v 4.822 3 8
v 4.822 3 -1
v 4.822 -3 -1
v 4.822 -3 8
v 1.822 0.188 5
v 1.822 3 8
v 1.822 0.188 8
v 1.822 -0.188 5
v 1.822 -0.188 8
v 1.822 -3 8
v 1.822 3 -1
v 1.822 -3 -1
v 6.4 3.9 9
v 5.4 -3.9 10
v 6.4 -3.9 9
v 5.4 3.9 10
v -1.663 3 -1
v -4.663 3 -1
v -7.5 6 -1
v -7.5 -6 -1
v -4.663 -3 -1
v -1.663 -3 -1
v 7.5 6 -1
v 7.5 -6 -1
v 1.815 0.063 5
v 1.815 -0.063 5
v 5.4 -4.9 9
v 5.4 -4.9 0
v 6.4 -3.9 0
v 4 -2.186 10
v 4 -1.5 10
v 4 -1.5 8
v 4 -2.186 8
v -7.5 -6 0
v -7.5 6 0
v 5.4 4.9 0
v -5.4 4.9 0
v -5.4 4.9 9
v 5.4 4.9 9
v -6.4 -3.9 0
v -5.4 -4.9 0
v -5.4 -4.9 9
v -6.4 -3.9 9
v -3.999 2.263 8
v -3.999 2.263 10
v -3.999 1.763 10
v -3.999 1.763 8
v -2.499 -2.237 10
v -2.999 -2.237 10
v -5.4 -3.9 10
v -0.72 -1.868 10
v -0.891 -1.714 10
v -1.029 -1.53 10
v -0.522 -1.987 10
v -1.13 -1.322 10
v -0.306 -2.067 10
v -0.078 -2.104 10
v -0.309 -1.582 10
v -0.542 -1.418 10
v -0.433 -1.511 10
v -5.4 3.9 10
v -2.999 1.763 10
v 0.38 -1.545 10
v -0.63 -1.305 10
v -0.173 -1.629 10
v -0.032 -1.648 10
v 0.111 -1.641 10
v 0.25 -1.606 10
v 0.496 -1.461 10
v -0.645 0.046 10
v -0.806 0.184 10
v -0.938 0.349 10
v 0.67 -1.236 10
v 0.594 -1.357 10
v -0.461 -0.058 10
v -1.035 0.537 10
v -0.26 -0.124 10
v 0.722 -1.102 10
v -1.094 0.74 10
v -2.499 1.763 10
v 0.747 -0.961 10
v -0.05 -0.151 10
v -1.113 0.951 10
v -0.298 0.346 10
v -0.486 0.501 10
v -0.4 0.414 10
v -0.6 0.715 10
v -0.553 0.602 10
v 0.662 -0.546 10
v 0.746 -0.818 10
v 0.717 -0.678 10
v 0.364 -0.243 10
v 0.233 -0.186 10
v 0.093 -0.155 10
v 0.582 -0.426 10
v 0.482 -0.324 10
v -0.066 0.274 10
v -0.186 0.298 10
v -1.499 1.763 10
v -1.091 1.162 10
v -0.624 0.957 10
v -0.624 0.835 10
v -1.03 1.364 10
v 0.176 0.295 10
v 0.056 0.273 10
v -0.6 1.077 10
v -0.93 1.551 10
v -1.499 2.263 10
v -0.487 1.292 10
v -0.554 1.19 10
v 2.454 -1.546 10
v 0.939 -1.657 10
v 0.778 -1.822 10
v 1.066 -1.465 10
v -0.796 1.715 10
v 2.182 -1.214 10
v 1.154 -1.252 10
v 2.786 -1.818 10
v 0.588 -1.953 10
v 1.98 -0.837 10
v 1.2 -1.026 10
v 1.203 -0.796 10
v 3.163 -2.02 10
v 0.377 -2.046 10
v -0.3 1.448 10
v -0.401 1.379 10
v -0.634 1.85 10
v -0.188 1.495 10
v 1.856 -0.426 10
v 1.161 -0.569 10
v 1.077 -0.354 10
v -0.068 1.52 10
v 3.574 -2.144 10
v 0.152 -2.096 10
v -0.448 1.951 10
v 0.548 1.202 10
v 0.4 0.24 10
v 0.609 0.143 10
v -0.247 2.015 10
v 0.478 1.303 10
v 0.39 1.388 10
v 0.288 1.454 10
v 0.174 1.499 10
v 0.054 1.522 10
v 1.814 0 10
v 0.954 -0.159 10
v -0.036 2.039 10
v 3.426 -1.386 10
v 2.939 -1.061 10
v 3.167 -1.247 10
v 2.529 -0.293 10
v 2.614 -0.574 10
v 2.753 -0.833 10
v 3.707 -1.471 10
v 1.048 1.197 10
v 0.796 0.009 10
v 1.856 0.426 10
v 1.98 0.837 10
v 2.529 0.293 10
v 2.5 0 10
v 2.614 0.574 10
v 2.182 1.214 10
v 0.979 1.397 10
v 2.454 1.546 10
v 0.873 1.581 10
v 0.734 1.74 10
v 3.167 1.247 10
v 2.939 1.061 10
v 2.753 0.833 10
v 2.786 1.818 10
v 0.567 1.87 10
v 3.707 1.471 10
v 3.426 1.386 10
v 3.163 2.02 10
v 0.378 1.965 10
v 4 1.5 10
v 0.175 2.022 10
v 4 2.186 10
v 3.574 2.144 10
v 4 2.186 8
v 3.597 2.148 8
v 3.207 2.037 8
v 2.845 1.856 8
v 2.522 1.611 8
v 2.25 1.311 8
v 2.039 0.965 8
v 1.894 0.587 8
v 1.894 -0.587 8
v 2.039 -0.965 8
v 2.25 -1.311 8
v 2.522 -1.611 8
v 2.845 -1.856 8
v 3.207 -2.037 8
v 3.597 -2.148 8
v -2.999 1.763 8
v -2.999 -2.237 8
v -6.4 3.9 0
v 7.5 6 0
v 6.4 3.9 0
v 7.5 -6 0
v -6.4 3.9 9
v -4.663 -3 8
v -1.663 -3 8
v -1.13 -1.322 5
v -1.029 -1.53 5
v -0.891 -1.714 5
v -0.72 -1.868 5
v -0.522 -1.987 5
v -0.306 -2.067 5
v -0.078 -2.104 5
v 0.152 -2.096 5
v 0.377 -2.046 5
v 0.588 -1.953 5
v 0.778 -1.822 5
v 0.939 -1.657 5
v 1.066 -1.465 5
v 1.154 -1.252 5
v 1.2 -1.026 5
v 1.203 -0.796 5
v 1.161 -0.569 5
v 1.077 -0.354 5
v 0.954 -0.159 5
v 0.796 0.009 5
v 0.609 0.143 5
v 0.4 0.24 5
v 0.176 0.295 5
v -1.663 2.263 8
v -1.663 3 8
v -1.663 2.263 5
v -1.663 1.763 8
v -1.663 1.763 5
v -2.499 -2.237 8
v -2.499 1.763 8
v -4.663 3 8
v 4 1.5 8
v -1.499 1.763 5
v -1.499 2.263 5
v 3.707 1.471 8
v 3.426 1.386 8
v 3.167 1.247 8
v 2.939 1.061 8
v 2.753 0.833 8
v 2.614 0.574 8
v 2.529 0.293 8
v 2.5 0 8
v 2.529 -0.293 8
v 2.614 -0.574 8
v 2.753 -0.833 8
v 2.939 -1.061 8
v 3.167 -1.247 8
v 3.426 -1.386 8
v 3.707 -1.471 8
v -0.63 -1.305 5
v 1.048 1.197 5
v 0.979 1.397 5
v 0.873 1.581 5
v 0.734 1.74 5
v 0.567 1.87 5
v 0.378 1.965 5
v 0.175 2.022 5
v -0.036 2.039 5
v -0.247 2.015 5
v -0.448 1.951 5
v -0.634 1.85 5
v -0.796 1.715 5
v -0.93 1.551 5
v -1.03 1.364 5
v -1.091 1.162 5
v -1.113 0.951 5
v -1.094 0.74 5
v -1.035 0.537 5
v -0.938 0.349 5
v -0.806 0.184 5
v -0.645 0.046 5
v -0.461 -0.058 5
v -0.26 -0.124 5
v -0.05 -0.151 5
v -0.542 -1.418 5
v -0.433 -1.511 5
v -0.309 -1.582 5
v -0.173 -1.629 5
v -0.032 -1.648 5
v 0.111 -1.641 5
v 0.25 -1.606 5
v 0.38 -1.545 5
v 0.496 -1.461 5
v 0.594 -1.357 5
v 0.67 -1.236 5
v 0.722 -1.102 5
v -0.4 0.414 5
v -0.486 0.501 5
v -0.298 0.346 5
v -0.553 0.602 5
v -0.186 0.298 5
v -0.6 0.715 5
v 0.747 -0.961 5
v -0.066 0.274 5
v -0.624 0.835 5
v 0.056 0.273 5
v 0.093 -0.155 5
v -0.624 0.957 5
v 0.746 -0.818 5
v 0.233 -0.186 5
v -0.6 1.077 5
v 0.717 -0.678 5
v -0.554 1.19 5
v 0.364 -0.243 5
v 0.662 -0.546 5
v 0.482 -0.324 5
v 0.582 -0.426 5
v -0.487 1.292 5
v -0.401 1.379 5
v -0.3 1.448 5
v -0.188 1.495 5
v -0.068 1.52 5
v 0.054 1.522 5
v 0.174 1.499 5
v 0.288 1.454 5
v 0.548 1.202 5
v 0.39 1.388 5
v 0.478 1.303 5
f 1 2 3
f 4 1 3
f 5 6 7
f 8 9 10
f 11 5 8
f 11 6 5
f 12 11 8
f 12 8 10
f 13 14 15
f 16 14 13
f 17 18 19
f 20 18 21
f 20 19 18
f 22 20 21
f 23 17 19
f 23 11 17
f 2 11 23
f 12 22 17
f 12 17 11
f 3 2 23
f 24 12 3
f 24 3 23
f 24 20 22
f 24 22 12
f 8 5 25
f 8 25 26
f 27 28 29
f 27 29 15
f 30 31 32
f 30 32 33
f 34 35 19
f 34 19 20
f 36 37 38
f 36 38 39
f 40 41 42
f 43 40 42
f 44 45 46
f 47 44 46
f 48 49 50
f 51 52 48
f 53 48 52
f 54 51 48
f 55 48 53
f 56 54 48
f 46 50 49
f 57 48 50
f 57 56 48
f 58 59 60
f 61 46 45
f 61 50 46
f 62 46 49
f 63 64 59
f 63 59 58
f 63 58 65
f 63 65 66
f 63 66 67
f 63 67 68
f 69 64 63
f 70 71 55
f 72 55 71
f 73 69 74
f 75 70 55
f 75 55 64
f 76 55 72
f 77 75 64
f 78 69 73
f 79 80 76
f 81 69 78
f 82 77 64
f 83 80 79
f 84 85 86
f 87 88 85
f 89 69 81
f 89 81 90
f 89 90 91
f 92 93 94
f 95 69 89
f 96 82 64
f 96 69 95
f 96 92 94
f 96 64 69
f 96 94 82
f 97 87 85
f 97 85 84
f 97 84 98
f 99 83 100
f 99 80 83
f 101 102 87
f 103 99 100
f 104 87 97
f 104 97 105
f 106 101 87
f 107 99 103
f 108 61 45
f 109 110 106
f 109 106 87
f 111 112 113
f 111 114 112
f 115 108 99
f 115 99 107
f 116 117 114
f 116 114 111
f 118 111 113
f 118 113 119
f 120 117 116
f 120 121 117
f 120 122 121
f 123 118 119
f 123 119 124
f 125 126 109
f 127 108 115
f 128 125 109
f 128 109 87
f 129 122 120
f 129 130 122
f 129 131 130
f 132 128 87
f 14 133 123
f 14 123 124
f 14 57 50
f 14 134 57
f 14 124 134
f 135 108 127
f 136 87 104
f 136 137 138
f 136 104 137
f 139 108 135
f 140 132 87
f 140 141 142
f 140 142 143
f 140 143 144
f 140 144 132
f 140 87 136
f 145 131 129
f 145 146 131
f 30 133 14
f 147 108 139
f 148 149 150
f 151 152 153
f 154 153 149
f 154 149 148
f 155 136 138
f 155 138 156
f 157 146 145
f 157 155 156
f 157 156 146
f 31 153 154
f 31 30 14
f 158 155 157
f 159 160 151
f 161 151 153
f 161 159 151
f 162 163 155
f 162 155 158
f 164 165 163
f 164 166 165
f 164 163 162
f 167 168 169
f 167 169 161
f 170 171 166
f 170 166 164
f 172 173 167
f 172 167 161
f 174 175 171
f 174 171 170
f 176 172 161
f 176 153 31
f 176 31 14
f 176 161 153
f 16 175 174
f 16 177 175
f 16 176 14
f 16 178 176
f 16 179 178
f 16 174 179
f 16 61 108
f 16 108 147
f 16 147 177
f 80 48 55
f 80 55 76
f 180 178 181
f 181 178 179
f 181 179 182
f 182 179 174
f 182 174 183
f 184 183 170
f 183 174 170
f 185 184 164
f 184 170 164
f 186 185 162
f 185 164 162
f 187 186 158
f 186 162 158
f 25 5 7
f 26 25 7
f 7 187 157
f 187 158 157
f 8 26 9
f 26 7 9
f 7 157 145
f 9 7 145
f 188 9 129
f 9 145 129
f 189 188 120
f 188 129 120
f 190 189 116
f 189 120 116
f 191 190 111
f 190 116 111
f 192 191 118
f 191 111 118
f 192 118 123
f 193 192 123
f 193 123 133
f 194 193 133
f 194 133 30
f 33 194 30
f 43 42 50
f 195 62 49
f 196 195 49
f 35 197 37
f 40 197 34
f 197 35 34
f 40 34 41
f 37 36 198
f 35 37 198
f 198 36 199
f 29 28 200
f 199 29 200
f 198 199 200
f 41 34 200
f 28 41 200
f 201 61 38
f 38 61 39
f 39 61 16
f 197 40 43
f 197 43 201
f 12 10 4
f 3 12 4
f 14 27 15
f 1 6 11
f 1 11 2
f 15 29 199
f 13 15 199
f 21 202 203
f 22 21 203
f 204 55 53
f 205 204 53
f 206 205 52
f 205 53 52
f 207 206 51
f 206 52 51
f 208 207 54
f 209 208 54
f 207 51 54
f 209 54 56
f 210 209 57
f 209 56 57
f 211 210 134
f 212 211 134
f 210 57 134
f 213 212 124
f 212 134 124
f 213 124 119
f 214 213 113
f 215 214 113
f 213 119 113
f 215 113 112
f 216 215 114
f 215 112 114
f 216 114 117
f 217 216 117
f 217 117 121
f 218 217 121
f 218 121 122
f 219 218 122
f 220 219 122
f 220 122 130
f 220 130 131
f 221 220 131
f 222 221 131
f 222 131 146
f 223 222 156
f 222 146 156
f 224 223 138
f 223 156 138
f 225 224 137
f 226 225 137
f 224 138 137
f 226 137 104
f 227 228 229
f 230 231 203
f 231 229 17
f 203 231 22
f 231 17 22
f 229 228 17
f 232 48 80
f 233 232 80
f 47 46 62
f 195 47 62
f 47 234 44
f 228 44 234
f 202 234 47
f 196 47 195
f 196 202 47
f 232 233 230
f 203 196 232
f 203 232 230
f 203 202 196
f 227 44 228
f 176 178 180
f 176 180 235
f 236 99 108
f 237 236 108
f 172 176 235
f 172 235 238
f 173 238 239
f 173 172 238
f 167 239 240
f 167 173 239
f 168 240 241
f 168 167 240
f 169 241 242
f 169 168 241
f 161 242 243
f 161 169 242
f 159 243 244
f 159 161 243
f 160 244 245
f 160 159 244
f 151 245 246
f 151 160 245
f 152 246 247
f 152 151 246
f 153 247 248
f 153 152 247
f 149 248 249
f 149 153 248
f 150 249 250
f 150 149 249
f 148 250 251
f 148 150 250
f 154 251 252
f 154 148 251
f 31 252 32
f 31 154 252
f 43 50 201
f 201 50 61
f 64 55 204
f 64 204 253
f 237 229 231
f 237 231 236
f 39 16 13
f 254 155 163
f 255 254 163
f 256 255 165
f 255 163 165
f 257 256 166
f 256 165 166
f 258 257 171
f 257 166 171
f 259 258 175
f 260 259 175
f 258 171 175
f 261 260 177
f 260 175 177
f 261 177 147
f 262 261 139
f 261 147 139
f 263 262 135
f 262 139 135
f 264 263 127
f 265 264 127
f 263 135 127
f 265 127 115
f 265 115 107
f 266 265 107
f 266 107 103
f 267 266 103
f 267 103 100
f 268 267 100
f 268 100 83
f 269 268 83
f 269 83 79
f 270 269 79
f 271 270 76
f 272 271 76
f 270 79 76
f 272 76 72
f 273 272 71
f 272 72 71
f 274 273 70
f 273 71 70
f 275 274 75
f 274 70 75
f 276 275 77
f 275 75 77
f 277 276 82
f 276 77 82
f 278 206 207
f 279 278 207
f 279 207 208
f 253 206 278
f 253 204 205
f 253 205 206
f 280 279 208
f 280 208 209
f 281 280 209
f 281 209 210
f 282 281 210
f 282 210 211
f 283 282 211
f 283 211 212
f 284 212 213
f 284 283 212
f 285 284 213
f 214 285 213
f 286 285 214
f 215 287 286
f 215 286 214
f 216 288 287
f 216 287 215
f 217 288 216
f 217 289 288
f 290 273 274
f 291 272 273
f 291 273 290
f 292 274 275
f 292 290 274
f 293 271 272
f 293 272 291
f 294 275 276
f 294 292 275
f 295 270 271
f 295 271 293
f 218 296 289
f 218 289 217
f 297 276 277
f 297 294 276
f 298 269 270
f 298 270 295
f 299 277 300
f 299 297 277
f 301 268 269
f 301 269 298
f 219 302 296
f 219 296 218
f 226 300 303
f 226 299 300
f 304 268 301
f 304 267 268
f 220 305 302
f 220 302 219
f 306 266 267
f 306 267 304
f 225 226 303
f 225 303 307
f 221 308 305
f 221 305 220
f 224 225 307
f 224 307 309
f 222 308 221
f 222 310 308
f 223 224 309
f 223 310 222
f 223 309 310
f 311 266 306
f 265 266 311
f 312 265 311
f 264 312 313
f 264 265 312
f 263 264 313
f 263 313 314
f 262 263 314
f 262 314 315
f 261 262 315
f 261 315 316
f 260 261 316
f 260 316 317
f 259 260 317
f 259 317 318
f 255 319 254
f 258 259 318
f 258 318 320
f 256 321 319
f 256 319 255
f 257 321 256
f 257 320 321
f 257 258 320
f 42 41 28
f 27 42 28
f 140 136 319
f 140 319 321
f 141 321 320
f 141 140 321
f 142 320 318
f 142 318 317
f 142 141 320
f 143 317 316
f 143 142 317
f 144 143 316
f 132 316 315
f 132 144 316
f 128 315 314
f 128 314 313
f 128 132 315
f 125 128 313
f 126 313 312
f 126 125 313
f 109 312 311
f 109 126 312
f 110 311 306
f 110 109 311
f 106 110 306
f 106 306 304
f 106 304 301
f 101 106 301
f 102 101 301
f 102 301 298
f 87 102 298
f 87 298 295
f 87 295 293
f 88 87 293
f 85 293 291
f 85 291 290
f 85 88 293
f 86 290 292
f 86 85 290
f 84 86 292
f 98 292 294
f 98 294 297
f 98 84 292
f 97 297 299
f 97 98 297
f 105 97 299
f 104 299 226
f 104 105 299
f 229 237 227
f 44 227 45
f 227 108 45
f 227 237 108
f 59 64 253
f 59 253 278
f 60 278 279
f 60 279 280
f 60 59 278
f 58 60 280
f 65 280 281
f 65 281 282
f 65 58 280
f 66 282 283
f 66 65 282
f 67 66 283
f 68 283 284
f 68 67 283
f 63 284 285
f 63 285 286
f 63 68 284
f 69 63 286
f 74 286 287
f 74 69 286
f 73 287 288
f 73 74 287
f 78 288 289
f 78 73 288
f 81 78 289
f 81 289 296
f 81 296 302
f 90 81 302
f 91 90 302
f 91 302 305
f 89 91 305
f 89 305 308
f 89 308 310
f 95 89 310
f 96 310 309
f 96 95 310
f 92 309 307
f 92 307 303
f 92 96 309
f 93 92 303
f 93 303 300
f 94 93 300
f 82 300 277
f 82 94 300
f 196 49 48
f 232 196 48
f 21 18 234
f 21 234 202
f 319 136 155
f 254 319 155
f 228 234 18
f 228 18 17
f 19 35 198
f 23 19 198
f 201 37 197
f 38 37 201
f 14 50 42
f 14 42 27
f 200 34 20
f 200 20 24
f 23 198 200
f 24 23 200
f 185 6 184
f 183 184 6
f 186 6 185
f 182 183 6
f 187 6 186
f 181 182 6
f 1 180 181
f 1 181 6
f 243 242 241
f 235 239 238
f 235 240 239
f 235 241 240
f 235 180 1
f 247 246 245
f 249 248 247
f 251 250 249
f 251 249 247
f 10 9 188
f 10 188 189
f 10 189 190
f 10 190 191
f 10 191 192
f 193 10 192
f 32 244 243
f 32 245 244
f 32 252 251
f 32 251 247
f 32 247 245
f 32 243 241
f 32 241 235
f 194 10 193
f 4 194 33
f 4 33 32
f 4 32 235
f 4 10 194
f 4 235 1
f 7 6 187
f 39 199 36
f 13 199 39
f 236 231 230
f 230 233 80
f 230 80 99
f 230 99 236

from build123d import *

# Parameters (mm, degrees)
SKETCH_W        = 12.8
SKETCH_H        = 9.8
PAD_DEPTH       = 10
POCKET_DEPTH    = 5
SKETCH002_W     = 15
SKETCH002_H     = 12
PAD001_DEPTH    = 1
CHAMFER_SIZE    = 1
SKETCH003_W     = 3
SKETCH003_H     = 6
POCKET001_DEPTH = 9


with BuildPart() as part:
    # Sketch → Pad (new body)
    with BuildSketch(Plane.XY):
        Rectangle(SKETCH_W, SKETCH_H)
    extrude(amount=PAD_DEPTH)

    # Sketch001 (on Face6 of Pad) → Pocket (cut)
    with BuildSketch(Plane.XY.offset(10)):
        Polygon((-3.99861, 2.2628), (-3.99861, 1.7628), (-2.99861, 1.7628), (-2.99861, -2.2372), (-2.49861, -2.2372), (-2.49861, 1.7628), (-1.49861, 1.7628), (-1.49861, 2.2628), align=None)
        with BuildLine():
            ThreePointArc((1.047539, 1.197216), (-0.867234, 1.635805), (-0.050275, -0.150615))
            ThreePointArc((-0.630407, -1.305236), (0.670164, -1.235647), (-0.050275, -0.150615))
            Line((-1.130407, -1.322386), (-0.630407, -1.305236))
            ThreePointArc((-1.130407, -1.322386), (0.939152, -1.657302), (0.175897, 0.295308))
            ThreePointArc((0.547539, 1.20235), (-0.580104, 1.134721), (0.175897, 0.295308))
            Line((0.547539, 1.20235), (1.047539, 1.197216))
        make_face()
        with BuildLine():
            ThreePointArc((4, 2.186018), (1.813982, 0), (4, -2.186018))
            Line((4, -1.5), (4, -2.186018))
            ThreePointArc((4, 1.5), (2.5, 0), (4, -1.5))
            Line((4, 2.186018), (4, 1.5))
        make_face()
    extrude(amount=-POCKET_DEPTH, mode=Mode.SUBTRACT)

    # Sketch002 (on Face4 of Pocket) → Pad001 (join)
    with BuildSketch(Plane(origin=(0, 0, 0), x_dir=(1, 0, 0), z_dir=(0, 0, -1))):
        Rectangle(SKETCH002_W, SKETCH002_H)
    extrude(amount=PAD001_DEPTH)

    # Chamfer
    chamfer_edges = [part.edges().sort_by_distance(p)[0] for p in [
        (6.4, -4.9, 5),
        (-6.4, -4.9, 5),
        (0, -4.9, 10),
        (-6.4, 0, 10),
        (0, 4.9, 10),
        (6.4, 0, 10),
        (6.4, 4.9, 5),
        (-6.4, 4.9, 5),
    ]]
    chamfer(chamfer_edges, length=CHAMFER_SIZE)

    # Sketch003 (on Face22 of Chamfer) → Pocket001 (cut)
    with BuildSketch(Plane(origin=(0, 0, -1), x_dir=(1, 0, 0), z_dir=(0, 0, -1))):
        with Locations((-3.162799, 0)):
            Rectangle(SKETCH003_W, SKETCH003_H)
        with Locations((3.322114, 0)):
            Rectangle(SKETCH003_W, SKETCH003_H)
    extrude(amount=-POCKET001_DEPTH, mode=Mode.SUBTRACT)


solid = part.part
